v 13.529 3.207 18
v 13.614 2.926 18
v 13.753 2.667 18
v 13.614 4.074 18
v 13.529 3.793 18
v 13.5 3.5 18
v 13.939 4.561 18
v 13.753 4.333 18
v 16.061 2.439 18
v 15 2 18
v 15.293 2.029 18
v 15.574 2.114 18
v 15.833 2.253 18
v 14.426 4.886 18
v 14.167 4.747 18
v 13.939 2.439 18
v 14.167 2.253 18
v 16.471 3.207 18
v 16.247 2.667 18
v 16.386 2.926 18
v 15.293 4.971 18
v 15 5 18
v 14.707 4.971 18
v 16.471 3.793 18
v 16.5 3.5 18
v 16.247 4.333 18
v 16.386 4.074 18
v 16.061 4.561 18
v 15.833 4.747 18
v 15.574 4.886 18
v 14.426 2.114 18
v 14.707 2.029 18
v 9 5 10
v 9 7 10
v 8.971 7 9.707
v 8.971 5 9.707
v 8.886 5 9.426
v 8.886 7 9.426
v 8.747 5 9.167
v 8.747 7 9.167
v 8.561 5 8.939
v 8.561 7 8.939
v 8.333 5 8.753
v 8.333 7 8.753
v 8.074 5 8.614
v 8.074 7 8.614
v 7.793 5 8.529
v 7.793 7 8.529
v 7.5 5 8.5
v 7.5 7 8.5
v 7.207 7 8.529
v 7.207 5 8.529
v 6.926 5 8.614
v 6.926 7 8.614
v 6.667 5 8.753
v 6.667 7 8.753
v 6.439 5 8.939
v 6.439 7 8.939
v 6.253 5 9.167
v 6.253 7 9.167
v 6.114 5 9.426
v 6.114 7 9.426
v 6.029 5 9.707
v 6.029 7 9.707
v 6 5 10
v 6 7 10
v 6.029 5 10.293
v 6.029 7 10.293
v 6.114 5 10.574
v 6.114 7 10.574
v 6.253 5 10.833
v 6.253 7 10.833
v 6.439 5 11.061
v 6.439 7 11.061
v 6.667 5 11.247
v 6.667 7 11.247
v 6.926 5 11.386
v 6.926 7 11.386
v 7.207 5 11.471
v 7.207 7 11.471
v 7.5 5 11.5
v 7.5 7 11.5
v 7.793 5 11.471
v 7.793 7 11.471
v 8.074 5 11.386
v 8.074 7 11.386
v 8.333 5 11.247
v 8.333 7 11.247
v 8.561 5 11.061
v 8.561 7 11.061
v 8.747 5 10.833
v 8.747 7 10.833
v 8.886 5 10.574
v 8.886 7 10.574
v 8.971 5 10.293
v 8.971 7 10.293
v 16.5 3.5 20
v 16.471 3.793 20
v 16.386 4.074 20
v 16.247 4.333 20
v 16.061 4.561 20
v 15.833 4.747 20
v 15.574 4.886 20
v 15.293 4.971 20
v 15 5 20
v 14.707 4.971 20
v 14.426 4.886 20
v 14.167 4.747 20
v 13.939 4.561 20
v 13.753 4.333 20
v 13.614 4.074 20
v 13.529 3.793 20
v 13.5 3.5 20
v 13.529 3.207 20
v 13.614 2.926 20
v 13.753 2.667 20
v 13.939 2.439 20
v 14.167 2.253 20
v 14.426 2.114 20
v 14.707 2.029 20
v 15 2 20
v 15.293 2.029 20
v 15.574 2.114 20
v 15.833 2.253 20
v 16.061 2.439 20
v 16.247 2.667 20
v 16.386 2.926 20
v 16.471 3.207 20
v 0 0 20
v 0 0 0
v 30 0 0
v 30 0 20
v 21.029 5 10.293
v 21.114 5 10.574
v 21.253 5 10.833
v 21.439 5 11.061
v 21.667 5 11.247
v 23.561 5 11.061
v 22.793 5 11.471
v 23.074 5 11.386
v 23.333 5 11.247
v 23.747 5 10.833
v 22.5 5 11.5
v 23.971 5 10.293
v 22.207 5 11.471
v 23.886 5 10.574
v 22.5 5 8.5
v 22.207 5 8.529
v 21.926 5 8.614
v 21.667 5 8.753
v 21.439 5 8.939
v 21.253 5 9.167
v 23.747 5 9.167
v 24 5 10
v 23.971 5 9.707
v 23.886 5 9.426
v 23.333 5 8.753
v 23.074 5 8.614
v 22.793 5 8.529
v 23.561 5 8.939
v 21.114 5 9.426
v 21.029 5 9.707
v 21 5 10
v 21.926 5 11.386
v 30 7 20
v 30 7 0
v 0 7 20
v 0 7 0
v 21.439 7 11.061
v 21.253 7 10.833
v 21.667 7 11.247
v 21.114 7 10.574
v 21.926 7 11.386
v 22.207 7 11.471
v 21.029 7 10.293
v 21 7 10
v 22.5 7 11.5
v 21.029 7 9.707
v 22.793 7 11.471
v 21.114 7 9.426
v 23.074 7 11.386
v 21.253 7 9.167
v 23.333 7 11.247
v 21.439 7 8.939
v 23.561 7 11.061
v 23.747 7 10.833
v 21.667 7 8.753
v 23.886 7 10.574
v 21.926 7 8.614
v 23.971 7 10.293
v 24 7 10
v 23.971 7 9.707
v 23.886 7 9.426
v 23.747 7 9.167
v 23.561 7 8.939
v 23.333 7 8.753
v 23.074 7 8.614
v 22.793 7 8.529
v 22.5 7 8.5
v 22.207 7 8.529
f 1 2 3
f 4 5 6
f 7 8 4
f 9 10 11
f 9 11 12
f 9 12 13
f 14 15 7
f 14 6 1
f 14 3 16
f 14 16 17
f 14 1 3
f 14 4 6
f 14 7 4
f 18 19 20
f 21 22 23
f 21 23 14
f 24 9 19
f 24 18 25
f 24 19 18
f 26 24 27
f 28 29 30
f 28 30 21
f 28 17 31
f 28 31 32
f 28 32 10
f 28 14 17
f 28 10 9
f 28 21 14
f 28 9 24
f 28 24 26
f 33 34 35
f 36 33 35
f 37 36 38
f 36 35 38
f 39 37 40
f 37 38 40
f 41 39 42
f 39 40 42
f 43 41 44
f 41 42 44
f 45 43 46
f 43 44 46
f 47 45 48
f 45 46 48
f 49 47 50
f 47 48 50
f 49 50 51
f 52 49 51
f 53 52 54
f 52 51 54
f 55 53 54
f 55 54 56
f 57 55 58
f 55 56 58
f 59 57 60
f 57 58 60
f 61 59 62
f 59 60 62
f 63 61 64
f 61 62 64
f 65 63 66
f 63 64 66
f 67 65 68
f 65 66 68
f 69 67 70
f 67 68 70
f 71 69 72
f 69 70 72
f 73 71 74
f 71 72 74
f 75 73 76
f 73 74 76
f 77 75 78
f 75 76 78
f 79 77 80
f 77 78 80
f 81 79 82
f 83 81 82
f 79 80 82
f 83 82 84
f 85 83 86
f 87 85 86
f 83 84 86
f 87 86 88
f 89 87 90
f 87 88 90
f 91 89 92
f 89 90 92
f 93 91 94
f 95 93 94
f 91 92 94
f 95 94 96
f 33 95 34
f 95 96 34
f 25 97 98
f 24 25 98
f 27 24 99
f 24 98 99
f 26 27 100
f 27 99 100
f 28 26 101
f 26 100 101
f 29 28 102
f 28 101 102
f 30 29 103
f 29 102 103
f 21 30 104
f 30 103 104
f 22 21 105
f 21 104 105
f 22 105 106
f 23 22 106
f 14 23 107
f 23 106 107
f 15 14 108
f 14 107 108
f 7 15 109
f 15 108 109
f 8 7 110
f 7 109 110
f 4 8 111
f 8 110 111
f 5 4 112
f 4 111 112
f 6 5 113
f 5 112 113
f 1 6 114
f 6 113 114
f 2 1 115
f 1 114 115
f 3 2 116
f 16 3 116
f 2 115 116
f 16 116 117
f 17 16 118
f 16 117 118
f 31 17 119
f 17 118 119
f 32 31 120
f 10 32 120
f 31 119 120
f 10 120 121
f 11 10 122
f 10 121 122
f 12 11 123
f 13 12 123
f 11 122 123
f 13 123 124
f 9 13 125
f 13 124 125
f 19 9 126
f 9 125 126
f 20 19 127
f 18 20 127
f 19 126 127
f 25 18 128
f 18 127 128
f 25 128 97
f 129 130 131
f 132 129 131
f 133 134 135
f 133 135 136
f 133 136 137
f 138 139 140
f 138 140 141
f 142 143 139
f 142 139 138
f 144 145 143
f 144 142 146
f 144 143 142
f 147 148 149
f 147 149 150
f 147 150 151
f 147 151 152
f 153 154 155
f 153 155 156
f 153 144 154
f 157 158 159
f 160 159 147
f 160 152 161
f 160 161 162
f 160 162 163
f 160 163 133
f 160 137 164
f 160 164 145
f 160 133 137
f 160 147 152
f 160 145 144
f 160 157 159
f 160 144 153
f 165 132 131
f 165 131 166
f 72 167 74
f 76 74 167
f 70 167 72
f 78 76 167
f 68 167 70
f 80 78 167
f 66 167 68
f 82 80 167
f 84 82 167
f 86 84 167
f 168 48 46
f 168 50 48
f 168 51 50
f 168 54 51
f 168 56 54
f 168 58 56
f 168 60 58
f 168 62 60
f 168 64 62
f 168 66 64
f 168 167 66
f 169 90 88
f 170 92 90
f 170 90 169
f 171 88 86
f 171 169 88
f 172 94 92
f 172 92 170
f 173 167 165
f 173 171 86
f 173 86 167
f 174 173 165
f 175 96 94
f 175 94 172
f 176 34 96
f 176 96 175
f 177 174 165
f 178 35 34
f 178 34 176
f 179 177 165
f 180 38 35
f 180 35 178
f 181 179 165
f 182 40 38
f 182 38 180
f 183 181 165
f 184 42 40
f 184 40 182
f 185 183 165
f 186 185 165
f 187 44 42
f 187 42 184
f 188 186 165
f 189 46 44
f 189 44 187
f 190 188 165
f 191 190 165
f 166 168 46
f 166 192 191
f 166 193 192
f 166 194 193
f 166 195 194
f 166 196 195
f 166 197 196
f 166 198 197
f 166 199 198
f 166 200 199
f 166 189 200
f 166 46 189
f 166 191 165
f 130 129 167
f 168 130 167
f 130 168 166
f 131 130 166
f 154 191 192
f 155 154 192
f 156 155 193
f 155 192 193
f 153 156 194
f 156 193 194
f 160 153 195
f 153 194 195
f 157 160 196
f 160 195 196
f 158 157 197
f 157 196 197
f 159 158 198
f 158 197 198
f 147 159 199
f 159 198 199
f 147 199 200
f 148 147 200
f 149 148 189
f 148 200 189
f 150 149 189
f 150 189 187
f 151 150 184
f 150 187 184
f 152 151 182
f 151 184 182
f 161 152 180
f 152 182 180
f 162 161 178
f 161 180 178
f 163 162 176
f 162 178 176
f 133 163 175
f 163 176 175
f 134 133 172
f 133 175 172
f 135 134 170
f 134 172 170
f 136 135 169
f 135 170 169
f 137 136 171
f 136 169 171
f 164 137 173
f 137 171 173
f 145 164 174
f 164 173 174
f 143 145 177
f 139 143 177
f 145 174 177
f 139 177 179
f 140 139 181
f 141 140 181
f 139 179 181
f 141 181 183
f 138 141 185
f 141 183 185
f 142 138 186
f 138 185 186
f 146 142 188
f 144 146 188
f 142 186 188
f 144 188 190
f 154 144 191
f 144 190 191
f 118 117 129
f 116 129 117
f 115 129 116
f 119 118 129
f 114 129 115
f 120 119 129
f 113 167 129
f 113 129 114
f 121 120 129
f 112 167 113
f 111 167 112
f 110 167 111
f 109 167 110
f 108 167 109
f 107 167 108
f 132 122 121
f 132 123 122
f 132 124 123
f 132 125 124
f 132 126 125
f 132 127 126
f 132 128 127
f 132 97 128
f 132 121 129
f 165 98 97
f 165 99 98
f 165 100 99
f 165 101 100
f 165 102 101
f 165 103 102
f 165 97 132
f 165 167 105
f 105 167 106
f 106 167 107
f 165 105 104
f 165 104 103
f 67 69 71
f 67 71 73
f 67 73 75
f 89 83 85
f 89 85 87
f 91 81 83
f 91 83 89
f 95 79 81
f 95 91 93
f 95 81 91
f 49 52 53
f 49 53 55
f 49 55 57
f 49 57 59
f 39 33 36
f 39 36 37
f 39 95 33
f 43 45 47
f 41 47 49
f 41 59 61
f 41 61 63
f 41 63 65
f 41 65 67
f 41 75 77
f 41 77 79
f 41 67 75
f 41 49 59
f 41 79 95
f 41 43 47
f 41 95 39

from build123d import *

# Parameters (mm, degrees)
SKETCH1_W           = 30
SKETCH1_H           = 7
BOSS_EXTRUDE1_DEPTH = 20
SKETCH2_R           = 1.5
CUT_EXTRUDE1_DEPTH  = 2
SKETCH3_R           = 1.5
CUT_EXTRUDE2_DEPTH  = 2


with BuildPart() as part:
    # Sketch1 → Boss-Extrude1 (new body)
    with BuildSketch(Plane.XY):
        with Locations((15, 3.5)):
            Rectangle(SKETCH1_W, SKETCH1_H)
    extrude(amount=BOSS_EXTRUDE1_DEPTH)

    # Sketch2 → Cut-Extrude1 (cut)
    with BuildSketch(Plane.XY.offset(20)):
        with Locations((15, 3.5)):
            Circle(SKETCH2_R)
    extrude(amount=-CUT_EXTRUDE1_DEPTH, mode=Mode.SUBTRACT)

    # Sketch3 → Cut-Extrude2 (cut)
    with BuildSketch(Plane(origin=(0, 7, 0), x_dir=(1, 0, 0), z_dir=(0, 1, 0))):
        with Locations((7.5, -10)):
            Circle(SKETCH3_R)
        with Locations((22.5, -10)):
            Circle(SKETCH3_R)
    extrude(amount=-CUT_EXTRUDE2_DEPTH, mode=Mode.SUBTRACT)


solid = part.part
